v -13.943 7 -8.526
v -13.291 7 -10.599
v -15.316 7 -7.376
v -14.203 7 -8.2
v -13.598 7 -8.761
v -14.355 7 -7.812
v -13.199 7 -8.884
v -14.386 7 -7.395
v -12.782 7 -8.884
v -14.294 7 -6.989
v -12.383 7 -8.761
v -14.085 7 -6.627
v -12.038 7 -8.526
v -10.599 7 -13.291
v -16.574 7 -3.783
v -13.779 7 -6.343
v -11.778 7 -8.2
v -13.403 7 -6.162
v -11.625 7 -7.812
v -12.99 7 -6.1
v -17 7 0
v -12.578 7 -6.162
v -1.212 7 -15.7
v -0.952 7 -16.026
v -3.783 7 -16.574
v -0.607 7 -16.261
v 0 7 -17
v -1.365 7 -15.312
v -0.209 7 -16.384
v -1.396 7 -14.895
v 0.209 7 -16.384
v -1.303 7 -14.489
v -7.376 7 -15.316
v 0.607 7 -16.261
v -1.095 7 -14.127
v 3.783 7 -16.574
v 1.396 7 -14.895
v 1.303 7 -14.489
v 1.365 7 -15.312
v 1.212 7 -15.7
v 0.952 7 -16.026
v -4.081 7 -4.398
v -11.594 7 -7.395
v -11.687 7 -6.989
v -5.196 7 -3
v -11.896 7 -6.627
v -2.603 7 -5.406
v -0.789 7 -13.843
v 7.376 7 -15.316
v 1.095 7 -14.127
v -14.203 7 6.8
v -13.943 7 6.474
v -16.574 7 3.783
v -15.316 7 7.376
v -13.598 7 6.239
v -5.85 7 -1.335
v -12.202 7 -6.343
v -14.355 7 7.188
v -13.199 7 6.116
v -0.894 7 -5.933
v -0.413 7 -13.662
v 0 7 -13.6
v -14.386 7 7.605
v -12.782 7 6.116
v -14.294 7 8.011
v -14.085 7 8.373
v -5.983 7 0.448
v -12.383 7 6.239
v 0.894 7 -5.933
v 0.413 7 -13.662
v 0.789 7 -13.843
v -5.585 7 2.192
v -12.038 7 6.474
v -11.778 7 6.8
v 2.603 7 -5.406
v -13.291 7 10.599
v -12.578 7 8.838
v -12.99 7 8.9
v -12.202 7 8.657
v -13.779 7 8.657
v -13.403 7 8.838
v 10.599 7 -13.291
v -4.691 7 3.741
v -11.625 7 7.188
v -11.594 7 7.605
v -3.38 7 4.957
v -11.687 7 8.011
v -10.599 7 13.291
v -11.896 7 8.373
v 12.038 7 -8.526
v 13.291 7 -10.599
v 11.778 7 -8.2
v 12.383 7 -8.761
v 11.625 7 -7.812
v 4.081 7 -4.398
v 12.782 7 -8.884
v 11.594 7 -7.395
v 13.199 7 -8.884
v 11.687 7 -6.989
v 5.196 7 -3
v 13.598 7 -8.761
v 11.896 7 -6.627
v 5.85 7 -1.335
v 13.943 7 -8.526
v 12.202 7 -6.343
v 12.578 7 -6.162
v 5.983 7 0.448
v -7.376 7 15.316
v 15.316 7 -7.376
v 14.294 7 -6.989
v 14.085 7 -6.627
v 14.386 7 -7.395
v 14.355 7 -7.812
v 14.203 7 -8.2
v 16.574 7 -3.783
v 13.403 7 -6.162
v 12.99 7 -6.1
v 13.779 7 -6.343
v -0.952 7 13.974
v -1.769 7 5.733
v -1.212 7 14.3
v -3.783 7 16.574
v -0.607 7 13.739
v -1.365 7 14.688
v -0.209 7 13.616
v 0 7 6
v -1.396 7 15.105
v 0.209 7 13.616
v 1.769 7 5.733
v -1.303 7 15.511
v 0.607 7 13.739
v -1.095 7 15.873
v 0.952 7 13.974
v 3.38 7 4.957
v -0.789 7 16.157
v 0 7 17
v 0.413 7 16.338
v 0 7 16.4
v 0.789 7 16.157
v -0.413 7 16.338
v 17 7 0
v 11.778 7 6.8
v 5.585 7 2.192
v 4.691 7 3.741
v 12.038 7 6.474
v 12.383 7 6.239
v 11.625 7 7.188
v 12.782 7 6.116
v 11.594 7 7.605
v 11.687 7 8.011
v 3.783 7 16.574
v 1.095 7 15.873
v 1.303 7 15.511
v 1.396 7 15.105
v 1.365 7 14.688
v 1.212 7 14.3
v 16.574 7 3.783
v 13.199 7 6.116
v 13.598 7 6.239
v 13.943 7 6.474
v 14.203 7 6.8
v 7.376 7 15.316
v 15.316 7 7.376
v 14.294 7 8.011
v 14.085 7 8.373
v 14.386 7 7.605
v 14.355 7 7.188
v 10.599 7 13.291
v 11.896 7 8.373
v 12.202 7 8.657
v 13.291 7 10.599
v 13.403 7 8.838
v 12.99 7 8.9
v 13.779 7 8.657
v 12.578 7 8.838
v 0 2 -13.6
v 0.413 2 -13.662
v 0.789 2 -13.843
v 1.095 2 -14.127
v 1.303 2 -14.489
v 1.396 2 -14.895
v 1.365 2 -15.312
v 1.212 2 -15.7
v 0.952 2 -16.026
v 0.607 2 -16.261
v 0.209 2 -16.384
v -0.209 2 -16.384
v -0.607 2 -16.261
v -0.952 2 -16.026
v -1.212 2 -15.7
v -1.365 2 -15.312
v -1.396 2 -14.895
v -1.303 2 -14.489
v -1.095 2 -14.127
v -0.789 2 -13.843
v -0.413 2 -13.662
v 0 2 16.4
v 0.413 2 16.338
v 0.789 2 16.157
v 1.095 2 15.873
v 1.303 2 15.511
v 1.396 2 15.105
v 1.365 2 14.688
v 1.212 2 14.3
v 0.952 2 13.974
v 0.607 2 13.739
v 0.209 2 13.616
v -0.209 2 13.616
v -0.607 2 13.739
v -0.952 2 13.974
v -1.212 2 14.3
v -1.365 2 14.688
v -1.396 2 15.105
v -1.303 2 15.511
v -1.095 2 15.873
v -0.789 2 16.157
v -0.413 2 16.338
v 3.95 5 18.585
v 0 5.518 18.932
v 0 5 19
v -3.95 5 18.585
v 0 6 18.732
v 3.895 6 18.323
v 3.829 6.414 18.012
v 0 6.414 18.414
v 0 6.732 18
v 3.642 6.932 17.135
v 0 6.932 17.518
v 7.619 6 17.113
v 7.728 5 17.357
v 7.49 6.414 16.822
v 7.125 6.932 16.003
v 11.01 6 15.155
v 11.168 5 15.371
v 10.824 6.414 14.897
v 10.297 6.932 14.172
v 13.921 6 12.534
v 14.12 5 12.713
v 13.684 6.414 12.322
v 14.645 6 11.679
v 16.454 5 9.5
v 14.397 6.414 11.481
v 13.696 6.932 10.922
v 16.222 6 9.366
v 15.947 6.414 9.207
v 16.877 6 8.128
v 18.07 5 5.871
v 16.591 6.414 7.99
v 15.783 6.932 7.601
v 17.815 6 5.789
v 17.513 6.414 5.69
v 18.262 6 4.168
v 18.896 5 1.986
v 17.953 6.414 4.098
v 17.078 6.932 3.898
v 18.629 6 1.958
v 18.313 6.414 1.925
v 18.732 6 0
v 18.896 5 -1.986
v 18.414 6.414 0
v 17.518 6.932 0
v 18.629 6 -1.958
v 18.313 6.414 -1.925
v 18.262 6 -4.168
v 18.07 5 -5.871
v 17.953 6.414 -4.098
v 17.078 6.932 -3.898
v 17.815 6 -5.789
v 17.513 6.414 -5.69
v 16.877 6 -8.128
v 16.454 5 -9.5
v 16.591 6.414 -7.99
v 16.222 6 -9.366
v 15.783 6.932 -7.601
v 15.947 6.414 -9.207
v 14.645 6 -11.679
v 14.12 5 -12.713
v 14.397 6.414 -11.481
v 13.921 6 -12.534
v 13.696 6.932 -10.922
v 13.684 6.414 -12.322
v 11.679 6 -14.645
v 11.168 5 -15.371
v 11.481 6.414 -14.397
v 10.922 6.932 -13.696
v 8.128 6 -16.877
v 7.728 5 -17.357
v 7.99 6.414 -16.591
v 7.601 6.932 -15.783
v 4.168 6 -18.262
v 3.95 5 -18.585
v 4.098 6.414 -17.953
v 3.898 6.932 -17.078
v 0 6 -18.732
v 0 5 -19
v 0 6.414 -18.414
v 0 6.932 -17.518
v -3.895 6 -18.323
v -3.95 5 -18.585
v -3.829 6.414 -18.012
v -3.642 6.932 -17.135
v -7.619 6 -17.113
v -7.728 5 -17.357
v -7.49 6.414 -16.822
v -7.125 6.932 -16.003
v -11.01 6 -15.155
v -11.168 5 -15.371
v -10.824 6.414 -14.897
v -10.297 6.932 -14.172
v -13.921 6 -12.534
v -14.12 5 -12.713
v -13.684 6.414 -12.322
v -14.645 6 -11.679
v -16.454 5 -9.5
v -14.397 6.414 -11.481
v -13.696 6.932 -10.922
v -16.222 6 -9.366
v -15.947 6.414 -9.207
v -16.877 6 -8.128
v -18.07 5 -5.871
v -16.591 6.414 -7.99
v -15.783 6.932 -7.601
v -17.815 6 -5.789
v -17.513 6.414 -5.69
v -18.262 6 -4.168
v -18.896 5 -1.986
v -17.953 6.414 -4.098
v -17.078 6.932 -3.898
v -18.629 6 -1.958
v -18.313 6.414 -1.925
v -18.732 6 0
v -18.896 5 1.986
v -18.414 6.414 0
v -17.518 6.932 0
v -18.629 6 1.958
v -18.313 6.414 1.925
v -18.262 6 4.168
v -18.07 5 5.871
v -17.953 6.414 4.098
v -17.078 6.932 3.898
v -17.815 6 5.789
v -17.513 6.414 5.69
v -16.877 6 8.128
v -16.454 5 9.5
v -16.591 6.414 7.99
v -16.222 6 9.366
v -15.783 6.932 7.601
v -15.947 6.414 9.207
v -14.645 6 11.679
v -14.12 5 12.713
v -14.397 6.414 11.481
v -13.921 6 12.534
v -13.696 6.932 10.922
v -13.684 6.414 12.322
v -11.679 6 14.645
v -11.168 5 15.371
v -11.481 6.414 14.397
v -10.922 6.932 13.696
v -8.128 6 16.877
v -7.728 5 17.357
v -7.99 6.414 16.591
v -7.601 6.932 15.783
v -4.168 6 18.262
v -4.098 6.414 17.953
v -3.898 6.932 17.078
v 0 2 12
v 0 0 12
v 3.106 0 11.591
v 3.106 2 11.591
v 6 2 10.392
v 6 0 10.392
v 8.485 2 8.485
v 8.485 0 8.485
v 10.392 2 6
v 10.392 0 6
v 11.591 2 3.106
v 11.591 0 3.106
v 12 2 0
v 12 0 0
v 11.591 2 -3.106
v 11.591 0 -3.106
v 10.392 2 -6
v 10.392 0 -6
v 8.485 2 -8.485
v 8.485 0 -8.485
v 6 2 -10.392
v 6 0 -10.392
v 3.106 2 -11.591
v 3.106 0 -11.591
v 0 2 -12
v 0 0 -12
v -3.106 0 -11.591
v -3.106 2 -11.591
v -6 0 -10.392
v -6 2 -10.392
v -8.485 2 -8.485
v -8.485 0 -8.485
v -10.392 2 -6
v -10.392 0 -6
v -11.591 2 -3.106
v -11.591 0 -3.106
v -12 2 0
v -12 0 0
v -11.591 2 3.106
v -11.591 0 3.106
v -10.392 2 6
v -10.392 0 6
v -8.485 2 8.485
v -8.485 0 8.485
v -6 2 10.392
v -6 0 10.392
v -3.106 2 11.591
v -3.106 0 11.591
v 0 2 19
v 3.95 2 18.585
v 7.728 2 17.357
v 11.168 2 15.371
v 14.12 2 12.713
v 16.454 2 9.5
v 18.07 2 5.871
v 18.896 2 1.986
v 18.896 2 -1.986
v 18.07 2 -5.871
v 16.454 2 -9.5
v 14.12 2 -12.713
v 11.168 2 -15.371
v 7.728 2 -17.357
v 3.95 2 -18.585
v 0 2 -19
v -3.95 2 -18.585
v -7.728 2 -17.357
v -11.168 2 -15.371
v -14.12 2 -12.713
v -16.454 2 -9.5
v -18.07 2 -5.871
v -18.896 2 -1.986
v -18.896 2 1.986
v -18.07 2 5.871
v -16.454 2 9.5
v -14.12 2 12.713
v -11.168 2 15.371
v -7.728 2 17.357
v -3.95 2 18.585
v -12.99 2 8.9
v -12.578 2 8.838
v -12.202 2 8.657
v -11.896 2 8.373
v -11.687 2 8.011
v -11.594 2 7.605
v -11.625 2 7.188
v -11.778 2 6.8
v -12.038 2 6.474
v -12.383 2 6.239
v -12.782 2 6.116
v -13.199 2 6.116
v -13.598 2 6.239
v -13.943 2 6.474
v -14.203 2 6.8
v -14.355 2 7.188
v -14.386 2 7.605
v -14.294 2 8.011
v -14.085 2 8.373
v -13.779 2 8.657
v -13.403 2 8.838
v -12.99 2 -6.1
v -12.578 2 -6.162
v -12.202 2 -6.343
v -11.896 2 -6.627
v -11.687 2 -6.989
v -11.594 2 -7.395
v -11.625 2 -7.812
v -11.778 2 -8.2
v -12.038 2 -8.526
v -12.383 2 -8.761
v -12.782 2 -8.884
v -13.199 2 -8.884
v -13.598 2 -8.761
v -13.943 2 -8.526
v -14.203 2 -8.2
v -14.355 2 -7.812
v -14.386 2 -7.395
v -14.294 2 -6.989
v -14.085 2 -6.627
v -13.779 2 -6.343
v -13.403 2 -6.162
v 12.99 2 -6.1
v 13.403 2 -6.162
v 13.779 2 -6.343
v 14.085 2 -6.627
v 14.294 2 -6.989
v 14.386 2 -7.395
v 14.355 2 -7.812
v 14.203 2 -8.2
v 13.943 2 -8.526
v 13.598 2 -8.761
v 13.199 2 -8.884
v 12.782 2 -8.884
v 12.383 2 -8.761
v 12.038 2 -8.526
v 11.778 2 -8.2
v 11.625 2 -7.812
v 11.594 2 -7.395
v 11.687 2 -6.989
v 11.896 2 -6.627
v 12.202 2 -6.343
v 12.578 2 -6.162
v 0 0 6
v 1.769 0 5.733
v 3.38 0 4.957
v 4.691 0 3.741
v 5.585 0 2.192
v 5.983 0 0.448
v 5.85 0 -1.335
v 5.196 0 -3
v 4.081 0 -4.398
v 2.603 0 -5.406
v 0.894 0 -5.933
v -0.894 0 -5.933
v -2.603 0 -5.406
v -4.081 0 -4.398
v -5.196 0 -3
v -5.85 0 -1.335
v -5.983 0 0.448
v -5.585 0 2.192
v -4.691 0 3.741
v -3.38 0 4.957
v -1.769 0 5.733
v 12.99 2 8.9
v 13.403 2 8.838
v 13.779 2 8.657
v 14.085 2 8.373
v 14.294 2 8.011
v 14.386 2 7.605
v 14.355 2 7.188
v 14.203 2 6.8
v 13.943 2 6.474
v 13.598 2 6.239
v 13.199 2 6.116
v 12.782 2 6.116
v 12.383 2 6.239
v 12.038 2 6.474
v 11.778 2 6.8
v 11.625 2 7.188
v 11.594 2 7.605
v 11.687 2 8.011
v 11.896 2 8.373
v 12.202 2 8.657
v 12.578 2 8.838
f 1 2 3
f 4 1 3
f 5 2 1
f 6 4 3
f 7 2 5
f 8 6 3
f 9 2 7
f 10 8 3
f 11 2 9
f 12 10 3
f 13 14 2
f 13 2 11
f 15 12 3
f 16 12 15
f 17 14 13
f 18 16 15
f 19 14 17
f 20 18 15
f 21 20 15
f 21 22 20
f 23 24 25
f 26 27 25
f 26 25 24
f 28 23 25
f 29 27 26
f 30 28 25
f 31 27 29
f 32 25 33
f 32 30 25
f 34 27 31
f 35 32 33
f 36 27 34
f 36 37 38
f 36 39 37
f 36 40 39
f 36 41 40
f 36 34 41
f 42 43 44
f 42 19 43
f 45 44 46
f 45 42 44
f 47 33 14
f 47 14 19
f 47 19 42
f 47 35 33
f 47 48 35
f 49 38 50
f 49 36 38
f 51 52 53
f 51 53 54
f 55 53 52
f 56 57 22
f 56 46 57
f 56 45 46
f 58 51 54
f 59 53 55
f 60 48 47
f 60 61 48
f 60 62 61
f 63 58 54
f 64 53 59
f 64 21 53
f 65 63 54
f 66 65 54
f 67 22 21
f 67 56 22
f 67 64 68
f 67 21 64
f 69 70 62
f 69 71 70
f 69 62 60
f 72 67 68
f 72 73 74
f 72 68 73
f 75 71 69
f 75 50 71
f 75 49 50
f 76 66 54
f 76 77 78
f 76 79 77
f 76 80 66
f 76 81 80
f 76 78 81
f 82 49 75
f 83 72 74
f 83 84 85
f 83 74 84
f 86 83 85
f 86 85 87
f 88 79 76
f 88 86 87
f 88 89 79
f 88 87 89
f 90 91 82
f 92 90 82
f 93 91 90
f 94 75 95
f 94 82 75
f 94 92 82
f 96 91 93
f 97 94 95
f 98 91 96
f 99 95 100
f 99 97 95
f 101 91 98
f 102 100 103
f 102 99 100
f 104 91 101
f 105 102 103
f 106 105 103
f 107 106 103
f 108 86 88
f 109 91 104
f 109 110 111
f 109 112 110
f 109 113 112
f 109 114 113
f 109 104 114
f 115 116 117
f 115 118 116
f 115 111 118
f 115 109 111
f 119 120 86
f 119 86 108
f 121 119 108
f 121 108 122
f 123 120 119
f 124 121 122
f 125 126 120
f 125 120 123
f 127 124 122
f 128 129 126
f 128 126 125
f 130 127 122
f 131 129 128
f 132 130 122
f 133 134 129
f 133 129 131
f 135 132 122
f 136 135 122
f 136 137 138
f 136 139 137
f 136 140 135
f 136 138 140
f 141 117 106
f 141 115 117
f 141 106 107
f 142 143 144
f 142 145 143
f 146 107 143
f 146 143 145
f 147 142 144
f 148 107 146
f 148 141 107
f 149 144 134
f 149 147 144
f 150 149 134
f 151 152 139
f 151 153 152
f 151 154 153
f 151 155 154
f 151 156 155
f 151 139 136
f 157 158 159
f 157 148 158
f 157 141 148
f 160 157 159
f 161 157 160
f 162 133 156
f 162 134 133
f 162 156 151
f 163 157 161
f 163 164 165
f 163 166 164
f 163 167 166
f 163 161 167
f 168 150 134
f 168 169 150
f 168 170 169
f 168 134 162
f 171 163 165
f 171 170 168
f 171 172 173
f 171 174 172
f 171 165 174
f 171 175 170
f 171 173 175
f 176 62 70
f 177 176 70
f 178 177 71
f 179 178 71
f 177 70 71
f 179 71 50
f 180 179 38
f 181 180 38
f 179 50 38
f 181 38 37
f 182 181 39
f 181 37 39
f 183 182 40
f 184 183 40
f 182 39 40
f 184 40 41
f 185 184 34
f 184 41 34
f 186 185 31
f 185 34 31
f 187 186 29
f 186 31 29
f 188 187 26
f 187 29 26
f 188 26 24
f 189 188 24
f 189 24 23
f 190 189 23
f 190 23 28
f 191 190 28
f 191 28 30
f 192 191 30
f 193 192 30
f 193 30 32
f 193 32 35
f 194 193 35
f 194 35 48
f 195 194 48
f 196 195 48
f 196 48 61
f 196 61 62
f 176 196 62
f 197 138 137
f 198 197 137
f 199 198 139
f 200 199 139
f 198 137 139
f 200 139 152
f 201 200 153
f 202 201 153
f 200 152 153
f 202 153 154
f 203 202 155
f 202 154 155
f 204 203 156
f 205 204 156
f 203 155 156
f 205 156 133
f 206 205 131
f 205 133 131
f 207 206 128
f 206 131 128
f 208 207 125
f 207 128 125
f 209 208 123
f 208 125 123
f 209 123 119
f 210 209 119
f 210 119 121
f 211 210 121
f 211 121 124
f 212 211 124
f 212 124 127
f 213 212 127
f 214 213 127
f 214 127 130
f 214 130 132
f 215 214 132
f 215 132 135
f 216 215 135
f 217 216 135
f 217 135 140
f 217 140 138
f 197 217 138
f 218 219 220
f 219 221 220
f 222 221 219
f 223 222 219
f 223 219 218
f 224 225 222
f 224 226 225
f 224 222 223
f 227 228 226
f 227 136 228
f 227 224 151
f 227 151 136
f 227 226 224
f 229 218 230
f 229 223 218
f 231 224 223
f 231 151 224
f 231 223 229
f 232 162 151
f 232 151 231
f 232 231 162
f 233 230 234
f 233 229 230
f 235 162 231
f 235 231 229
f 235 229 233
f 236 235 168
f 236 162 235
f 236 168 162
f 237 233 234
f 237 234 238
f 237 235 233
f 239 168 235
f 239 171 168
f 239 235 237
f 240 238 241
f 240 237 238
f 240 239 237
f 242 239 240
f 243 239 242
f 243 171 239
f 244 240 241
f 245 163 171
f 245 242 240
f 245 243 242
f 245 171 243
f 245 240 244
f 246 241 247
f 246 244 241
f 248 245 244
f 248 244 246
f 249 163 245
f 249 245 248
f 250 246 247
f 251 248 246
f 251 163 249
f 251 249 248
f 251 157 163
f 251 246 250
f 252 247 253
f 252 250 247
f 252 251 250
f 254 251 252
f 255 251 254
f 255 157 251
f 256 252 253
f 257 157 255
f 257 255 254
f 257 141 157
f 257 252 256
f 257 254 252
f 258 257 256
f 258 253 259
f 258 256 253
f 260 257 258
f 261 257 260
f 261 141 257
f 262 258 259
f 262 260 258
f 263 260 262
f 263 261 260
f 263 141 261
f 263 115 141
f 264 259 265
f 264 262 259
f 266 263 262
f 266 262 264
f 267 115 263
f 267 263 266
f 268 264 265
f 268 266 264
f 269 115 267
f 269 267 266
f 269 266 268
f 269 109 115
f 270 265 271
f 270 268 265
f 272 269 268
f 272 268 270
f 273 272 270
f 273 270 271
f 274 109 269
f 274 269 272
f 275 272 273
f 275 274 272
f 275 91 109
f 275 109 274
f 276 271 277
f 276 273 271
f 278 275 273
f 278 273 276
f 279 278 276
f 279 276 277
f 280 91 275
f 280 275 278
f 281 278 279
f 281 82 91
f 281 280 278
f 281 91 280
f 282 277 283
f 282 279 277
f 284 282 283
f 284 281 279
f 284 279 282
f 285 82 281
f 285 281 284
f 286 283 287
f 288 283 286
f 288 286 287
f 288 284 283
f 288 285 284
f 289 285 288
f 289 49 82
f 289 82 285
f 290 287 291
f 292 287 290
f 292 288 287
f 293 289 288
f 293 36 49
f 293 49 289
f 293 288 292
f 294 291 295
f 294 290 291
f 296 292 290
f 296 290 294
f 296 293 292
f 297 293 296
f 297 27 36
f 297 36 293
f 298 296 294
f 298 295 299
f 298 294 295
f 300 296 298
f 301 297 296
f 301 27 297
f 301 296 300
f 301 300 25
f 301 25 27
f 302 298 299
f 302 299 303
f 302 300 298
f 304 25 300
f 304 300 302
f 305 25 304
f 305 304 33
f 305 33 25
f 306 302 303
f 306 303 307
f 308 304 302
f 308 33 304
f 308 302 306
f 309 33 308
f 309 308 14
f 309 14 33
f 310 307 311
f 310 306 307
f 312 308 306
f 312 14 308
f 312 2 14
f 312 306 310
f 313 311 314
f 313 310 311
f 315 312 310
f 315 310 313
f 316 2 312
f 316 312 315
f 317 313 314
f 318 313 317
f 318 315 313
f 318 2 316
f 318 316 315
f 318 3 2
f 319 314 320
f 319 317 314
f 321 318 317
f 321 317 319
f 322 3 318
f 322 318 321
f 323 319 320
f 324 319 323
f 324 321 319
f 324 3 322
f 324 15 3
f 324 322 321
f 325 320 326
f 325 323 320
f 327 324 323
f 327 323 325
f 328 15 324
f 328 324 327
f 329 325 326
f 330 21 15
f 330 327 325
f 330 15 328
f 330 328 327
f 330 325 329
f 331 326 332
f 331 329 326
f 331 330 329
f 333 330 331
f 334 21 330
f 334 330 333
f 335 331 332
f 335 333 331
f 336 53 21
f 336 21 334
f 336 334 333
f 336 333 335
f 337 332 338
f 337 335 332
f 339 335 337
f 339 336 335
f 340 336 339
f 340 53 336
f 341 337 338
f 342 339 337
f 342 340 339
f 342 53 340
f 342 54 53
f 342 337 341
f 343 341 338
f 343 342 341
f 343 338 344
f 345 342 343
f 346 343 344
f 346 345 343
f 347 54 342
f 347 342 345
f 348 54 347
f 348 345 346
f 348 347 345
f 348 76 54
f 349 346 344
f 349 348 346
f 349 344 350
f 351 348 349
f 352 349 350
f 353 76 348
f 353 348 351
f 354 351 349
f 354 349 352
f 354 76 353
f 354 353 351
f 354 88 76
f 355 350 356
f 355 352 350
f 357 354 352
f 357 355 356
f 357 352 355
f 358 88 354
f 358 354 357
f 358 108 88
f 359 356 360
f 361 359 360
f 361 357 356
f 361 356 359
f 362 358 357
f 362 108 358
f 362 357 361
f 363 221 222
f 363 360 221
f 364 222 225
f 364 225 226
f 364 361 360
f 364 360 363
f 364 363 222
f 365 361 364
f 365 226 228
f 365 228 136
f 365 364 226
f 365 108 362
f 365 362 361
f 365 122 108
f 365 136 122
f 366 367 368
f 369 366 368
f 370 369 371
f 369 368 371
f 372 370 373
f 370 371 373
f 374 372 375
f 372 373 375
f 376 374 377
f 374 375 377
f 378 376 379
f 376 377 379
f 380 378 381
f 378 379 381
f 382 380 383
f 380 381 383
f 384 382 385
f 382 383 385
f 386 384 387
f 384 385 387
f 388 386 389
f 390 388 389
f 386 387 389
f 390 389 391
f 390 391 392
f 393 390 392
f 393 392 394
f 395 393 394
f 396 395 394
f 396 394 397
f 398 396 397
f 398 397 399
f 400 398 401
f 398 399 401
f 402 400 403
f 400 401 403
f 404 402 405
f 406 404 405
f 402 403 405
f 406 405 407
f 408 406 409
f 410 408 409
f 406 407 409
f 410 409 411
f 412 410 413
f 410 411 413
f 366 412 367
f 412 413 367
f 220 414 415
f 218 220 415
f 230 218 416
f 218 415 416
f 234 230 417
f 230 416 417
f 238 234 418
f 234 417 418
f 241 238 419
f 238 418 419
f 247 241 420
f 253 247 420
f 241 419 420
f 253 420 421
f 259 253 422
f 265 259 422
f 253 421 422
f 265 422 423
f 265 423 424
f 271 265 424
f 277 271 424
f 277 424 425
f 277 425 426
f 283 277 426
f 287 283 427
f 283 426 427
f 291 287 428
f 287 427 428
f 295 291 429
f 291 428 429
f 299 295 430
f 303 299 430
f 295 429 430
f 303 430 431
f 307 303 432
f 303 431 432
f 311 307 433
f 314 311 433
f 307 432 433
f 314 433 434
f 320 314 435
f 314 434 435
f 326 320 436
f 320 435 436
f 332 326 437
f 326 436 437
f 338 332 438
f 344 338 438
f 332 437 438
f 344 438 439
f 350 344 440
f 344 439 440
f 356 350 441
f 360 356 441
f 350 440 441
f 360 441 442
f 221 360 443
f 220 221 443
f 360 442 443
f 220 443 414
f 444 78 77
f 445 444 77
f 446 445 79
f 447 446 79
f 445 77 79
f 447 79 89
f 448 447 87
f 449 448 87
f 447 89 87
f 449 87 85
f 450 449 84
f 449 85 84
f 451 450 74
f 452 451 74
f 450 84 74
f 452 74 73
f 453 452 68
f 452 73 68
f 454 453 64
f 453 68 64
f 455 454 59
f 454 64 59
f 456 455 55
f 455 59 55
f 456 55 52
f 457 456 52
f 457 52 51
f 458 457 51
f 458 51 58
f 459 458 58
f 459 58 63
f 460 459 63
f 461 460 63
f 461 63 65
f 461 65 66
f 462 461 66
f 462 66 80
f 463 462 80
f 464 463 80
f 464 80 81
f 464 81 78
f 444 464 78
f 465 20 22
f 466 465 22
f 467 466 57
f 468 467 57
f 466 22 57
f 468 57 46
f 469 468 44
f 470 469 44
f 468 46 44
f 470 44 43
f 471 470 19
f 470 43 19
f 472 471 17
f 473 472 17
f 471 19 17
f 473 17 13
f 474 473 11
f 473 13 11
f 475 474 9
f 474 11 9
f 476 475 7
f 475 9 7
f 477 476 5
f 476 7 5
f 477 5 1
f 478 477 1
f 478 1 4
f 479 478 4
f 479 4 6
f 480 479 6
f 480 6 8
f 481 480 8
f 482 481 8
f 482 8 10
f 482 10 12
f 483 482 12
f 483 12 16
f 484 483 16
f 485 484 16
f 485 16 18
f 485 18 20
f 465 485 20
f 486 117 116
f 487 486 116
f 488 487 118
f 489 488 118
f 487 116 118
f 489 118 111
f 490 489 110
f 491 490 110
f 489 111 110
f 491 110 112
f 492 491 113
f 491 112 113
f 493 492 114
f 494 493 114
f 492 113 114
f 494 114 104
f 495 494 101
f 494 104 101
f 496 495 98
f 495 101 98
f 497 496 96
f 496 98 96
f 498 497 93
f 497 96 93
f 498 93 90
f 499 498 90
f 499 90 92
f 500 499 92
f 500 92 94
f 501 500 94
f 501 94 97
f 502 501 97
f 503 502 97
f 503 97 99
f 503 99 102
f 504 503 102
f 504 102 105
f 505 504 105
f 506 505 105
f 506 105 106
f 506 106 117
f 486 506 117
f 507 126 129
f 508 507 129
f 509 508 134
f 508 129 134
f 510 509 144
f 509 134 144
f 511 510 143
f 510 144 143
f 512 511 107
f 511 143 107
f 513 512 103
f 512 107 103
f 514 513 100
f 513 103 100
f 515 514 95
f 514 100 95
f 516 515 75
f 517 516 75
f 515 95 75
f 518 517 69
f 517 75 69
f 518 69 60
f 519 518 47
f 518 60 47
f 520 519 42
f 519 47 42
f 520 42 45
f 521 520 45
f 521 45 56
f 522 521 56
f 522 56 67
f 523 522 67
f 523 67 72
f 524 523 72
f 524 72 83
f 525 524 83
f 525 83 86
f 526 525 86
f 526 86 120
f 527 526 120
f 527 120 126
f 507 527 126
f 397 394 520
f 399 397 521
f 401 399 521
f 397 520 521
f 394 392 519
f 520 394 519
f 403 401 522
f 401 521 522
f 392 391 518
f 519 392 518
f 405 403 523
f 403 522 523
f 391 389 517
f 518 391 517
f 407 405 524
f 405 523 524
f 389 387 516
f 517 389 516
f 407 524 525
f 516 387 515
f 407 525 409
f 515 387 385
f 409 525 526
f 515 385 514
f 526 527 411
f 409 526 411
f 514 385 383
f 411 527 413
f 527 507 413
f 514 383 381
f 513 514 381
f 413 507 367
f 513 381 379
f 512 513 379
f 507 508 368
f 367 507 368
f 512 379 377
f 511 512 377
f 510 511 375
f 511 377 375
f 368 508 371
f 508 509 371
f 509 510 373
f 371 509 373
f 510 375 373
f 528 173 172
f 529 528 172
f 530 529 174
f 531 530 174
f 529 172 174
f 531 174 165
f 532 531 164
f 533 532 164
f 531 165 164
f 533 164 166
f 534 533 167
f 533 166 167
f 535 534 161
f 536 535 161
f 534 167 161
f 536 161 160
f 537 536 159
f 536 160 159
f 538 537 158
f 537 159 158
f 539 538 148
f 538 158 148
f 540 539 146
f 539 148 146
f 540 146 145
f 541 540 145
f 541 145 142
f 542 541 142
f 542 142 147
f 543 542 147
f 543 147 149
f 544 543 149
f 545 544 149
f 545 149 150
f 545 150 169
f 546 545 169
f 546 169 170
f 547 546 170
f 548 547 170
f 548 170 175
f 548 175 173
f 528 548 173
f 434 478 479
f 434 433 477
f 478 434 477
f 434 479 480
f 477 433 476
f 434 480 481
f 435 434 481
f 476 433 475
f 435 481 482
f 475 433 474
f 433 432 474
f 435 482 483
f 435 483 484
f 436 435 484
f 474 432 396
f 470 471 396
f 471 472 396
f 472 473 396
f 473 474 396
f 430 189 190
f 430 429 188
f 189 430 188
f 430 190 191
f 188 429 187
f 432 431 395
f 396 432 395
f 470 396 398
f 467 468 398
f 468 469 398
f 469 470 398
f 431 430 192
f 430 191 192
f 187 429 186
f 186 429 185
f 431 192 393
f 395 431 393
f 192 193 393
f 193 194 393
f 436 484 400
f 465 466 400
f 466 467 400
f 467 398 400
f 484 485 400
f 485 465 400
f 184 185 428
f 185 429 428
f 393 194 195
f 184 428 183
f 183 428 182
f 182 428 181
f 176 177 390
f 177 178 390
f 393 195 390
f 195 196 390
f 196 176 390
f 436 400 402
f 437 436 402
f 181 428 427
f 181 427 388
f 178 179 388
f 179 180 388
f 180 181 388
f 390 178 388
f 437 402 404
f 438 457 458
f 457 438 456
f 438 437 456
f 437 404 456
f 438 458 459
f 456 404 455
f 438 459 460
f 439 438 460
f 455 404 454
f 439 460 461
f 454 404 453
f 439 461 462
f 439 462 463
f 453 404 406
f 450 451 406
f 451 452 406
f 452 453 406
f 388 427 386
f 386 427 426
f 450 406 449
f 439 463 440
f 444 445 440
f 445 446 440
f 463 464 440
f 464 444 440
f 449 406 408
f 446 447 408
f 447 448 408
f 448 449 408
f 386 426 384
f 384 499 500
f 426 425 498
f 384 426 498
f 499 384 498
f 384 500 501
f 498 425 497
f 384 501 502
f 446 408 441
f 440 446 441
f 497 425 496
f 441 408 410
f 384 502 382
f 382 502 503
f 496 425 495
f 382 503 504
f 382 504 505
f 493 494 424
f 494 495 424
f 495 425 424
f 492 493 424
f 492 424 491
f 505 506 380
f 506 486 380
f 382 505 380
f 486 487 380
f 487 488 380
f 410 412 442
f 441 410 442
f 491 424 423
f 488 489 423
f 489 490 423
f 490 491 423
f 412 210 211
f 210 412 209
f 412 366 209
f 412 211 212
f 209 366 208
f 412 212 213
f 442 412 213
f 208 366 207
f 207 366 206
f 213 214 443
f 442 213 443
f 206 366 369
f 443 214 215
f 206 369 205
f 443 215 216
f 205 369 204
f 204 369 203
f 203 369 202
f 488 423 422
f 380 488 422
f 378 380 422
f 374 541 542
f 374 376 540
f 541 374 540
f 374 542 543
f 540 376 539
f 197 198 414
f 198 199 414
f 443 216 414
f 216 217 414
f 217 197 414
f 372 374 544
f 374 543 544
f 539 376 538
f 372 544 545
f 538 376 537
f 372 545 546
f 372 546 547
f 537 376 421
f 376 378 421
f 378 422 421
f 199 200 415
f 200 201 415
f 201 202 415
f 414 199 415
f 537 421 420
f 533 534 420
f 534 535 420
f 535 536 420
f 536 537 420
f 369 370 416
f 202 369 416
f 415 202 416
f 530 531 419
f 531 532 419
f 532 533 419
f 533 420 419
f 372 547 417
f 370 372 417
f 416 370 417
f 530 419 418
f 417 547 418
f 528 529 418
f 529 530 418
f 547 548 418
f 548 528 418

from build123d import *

# Parameters (mm, degrees)
SKETCH1_R           = 12
BOSS_EXTRUDE1_DEPTH = 2
SKETCH2_R           = 19
BOSS_EXTRUDE2_DEPTH = 5
FILLET1_R           = 2
SKETCH3_R           = 6
SKETCH3_R_2         = 1.4
CUT_EXTRUDE1_DEPTH  = 28.766886822


with BuildPart() as part:
    # Sketch1 → Boss-Extrude1 (new body)
    with BuildSketch(Plane(origin=(0, 0, 0), x_dir=(1, 0, 0), z_dir=(0, 1, 0))):
        with Locations(Location((0, 0, 0), (0, 0, 270))):
            Circle(SKETCH1_R)
    extrude(amount=BOSS_EXTRUDE1_DEPTH)

    # Sketch2 → Boss-Extrude2 (add)
    with BuildSketch(Plane(origin=(0, 2, 0), x_dir=(1, 0, 0), z_dir=(0, 1, 0))):
        with Locations(Location((0, 0, 0), (0, 0, 270))):
            Circle(SKETCH2_R)
    extrude(amount=BOSS_EXTRUDE2_DEPTH)

    # Fillet1
    fillet1_edges = [part.edges().sort_by_distance(p)[0] for p in [
        (0, 7, -19),
    ]]
    fillet(fillet1_edges, radius=FILLET1_R)

    # Sketch3 → Cut-Extrude1 (cut, through all)
    with BuildSketch(Plane(origin=(0, 7, 0), x_dir=(1, 0, 0), z_dir=(0, 1, 0))):
        with Locations(Location((0, 0, 0), (0, 0, 270))):
            Circle(SKETCH3_R)
        with Locations(Location((0, 15, 0), (0, 0, 270))):
            Circle(SKETCH3_R_2)
        with Locations(Location((12.990381057, 7.5, 0), (0, 0, 270))):
            Circle(SKETCH3_R_2)
        with Locations(Location((12.990381057, -7.5, 0), (0, 0, 270))):
            Circle(SKETCH3_R_2)
        with Locations(Location((0, -15, 0), (0, 0, 270))):
            Circle(SKETCH3_R_2)
        with Locations(Location((-12.990381057, -7.5, 0), (0, 0, 270))):
            Circle(SKETCH3_R_2)
        with Locations(Location((-12.990381057, 7.5, 0), (0, 0, 270))):
            Circle(SKETCH3_R_2)
    extrude(amount=-CUT_EXTRUDE1_DEPTH, mode=Mode.SUBTRACT)


solid = part.part
